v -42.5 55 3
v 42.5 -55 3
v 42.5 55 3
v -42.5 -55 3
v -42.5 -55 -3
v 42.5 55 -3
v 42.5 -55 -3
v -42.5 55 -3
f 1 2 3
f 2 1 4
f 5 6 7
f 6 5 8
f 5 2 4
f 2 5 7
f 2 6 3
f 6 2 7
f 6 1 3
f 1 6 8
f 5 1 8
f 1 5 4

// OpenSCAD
// ========================================
// a 85 x 110 x 6 mm plate
// NeuroCAD canonical IR; dimensions are millimetres
// ========================================
$fn = 48;

cube(size=[85, 110, 6], center=true);
